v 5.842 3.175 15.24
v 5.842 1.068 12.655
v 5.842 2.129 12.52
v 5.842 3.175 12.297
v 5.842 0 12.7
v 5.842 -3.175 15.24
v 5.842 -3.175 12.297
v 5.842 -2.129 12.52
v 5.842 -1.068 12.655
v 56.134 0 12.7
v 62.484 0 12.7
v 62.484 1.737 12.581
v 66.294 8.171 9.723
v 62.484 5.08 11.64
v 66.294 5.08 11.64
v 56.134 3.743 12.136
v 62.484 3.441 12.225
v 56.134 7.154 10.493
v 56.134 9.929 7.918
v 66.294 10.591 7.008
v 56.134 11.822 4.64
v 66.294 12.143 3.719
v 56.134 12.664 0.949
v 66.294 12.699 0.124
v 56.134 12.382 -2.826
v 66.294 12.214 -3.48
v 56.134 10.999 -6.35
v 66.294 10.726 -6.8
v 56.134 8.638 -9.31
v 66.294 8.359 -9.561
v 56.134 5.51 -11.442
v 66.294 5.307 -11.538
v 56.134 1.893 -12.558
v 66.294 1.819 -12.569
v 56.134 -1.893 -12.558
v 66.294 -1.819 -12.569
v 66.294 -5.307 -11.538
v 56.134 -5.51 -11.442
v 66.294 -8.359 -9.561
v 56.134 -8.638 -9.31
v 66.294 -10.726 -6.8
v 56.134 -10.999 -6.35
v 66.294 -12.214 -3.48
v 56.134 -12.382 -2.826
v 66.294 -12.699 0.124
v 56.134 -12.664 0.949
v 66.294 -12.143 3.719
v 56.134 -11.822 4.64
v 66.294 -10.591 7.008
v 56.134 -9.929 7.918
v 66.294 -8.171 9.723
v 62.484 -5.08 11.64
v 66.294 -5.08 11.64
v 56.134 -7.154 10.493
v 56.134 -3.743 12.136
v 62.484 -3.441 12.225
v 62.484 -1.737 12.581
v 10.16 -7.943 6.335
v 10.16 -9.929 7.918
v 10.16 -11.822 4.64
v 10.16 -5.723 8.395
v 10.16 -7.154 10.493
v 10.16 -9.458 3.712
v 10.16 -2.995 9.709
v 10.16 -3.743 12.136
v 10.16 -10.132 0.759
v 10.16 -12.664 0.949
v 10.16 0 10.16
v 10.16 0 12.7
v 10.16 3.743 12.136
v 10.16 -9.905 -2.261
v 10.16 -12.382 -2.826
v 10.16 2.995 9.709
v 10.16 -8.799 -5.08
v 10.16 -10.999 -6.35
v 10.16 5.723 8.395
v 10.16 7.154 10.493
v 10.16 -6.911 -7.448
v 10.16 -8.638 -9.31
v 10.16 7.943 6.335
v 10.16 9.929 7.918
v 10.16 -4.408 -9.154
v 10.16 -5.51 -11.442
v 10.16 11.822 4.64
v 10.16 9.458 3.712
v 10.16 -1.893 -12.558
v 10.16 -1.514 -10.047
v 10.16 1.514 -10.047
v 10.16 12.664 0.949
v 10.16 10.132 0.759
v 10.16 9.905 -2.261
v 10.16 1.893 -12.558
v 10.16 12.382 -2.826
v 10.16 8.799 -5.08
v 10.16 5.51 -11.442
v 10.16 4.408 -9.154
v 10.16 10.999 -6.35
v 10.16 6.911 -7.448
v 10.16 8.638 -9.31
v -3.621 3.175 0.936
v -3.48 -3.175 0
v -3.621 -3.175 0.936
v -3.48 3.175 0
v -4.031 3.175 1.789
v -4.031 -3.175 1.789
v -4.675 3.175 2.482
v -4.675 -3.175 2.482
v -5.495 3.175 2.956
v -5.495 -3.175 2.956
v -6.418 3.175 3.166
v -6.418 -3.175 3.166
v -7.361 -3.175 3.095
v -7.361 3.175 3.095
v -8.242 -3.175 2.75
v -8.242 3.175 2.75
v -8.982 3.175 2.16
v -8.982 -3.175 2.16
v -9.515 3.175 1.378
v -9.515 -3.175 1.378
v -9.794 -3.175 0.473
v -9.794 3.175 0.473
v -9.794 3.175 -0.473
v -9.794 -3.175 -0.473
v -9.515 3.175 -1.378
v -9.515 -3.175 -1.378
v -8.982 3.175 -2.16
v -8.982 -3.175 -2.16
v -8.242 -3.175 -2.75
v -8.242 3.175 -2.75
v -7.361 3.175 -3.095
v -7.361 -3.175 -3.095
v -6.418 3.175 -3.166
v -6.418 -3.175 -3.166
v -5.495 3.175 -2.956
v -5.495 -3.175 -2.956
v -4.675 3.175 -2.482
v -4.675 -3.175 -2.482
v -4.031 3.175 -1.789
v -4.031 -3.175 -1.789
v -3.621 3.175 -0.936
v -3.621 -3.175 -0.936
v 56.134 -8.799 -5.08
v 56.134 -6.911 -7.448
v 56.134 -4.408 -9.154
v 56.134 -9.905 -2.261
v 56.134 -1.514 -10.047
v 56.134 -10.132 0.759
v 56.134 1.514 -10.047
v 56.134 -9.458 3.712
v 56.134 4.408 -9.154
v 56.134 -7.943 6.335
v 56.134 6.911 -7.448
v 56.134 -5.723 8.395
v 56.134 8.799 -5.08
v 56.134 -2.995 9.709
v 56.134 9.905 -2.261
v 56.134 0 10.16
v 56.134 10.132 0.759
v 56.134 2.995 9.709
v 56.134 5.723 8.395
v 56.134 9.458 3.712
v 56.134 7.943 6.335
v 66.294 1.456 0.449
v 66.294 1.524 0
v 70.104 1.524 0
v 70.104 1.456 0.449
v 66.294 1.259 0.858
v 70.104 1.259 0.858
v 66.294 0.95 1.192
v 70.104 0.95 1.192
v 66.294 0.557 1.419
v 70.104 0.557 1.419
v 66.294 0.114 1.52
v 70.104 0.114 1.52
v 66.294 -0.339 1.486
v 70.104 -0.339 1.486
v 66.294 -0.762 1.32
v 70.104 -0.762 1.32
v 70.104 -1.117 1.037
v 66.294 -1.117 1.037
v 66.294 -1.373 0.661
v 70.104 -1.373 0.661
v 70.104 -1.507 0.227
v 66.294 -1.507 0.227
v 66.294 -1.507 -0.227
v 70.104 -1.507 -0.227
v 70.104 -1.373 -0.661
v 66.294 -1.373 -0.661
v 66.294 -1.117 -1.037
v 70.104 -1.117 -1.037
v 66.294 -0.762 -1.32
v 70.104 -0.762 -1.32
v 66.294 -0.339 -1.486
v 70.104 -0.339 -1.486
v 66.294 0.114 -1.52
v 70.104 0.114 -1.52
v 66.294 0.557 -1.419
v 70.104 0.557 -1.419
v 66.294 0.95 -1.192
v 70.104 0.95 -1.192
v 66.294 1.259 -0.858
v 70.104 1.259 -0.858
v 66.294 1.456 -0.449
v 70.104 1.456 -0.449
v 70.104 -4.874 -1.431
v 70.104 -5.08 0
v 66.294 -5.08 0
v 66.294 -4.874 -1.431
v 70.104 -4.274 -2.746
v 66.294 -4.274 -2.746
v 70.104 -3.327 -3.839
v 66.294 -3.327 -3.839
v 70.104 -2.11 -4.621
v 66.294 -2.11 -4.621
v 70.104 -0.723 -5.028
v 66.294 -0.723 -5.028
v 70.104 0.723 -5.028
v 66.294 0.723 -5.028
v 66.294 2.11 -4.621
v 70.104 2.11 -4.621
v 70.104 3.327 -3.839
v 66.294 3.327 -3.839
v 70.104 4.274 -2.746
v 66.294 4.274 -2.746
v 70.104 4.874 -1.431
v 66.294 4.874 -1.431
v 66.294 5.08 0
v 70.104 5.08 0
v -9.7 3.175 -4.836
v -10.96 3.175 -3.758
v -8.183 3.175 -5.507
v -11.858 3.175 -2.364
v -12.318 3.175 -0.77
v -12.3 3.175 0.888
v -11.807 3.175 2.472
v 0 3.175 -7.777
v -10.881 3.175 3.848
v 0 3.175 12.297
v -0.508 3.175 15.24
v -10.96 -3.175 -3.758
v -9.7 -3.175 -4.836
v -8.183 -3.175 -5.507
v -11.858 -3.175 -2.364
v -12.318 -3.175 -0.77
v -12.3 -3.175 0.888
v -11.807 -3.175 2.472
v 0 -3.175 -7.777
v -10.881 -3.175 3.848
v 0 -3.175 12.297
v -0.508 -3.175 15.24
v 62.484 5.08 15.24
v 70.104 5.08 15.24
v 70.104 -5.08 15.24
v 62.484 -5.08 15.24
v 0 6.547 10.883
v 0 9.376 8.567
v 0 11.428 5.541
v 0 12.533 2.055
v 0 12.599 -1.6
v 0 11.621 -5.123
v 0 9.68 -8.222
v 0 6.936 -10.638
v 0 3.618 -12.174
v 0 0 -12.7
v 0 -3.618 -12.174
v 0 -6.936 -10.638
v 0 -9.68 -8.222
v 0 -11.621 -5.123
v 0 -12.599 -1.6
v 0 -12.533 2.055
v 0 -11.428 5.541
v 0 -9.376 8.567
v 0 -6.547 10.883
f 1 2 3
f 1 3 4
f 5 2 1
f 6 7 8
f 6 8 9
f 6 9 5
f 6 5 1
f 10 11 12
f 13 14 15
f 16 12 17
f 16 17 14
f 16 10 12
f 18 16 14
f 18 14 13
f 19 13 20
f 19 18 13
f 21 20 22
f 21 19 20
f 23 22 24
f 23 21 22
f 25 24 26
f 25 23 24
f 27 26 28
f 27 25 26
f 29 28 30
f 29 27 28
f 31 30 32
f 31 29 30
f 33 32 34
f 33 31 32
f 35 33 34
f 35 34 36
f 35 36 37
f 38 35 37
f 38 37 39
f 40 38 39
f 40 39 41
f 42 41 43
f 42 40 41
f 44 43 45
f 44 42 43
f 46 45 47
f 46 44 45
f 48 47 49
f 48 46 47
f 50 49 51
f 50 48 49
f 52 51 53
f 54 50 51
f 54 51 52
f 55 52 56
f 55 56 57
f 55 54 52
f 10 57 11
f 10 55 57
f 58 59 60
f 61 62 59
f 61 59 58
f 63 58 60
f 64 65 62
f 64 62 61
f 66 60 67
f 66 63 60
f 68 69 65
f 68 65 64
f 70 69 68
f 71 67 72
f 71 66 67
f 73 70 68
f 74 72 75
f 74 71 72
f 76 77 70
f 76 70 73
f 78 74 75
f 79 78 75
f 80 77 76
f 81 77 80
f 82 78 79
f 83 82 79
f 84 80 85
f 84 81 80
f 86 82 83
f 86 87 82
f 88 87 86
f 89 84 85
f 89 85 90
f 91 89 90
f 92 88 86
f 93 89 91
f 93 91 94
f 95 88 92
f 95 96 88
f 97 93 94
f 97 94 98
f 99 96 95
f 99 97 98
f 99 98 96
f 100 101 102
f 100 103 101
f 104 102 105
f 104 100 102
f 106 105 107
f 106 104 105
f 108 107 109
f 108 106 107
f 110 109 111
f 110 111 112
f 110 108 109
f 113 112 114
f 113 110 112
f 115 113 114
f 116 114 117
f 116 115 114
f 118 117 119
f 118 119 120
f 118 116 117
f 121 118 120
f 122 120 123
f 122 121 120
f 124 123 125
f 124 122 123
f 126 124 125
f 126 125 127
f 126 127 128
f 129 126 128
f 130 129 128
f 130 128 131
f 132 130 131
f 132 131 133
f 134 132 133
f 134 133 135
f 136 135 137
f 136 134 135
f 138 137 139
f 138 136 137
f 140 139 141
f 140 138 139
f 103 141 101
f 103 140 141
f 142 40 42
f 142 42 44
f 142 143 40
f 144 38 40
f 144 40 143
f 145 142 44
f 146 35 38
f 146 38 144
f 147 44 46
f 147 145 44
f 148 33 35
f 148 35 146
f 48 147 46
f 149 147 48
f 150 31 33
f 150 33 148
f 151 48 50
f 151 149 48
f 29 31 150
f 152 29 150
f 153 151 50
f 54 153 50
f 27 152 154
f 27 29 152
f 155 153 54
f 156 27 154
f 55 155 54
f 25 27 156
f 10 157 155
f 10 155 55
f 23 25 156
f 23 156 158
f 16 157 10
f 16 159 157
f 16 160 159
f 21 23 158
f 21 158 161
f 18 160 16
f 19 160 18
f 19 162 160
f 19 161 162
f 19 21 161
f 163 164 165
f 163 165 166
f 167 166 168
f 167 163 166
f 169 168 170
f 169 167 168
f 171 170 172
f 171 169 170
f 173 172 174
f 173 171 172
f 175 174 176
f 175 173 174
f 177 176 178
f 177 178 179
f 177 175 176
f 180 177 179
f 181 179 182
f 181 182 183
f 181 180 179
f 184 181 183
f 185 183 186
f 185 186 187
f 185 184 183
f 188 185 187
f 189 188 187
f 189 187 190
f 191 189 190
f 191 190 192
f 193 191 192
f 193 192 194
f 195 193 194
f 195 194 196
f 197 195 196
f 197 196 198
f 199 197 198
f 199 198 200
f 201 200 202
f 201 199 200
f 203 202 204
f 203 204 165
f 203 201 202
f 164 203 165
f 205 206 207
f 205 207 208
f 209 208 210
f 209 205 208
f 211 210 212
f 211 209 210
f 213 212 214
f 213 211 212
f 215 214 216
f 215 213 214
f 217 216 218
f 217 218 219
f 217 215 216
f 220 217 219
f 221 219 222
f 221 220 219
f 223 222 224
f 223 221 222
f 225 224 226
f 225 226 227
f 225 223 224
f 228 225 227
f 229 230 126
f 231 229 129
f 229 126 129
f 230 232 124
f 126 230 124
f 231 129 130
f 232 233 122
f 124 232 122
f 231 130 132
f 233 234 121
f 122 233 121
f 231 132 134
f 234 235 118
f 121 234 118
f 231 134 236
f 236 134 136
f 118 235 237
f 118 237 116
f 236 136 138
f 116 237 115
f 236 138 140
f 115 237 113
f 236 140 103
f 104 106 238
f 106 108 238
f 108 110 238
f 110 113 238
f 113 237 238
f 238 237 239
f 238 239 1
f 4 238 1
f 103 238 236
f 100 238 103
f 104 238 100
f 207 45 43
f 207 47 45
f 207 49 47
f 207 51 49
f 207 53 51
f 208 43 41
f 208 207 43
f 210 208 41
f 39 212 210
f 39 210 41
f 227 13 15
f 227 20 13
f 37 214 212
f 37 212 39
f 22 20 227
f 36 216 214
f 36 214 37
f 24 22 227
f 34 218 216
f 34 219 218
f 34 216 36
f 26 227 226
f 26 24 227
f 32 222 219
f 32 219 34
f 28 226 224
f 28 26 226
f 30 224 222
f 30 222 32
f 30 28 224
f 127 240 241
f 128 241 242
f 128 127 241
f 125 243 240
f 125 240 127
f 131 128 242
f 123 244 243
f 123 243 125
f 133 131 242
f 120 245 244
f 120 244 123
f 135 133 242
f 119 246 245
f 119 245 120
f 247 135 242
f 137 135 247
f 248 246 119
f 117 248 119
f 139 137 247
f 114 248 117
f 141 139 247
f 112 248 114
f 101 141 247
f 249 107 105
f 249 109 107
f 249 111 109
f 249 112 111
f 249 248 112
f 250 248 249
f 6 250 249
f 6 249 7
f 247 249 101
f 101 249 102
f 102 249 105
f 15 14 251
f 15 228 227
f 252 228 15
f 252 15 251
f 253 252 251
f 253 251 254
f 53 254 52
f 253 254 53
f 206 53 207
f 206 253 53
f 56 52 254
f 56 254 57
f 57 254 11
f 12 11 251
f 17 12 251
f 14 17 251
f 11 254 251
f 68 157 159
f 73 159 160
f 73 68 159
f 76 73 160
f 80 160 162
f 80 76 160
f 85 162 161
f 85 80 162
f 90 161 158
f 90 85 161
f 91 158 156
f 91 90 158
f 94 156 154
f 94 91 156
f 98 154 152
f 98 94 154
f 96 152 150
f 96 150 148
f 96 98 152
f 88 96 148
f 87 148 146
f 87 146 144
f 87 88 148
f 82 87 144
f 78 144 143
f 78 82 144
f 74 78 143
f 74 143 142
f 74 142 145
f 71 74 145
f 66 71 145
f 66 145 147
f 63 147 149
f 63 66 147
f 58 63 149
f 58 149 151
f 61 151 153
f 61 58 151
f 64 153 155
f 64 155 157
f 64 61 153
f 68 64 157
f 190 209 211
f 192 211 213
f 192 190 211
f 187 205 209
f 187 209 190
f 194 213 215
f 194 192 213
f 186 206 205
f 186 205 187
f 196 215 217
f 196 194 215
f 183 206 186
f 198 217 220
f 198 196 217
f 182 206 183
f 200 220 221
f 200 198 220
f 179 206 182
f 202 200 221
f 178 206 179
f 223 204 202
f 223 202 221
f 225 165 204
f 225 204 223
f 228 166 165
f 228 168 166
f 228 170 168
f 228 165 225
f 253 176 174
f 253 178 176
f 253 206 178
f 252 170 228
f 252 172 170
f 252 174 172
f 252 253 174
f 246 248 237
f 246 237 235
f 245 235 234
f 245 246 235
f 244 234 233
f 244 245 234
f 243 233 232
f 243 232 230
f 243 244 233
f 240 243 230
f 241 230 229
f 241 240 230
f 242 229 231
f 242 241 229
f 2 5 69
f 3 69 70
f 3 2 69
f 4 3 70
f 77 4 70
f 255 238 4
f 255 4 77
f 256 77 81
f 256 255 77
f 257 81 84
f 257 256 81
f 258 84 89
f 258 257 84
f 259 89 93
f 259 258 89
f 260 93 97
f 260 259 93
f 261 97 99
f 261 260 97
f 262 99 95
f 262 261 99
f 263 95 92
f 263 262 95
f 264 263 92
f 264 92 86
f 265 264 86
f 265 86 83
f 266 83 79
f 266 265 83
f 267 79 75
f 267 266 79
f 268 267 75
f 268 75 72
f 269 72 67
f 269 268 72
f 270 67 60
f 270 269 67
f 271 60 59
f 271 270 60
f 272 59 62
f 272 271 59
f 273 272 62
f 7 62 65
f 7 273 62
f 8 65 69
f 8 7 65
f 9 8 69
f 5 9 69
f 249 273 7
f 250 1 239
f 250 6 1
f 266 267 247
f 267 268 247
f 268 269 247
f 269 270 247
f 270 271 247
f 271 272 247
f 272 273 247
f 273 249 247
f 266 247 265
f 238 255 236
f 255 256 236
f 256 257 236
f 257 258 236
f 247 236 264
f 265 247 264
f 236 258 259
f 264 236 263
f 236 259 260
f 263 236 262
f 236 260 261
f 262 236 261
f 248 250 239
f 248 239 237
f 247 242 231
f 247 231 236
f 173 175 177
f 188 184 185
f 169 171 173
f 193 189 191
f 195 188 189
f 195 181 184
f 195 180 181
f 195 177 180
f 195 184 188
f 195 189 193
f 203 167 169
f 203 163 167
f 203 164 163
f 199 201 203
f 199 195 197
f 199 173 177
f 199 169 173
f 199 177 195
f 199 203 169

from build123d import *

# Parameters (mm, degrees)
F0_W     = 5.842
F0_H     = 12.7
F0_R     = 3.175
F2_DEPTH = 3.175
F3_R     = 1.524
F4_DEPTH = 3.81


with BuildPart() as f1:
    # F0 (on Front) → F1 (revolve)
    with BuildSketch(Plane.XZ):
        Polygon((5.842, 12.7), (5.842, 0), (66.294, 0), (66.294, 12.7), (56.134, 12.7), (56.134, 10.16), (10.16, 10.16), (10.16, 12.7), align=None)
        with Locations((2.921, 6.35)):
            Rectangle(F0_W, F0_H)
    revolve(axis=Axis((33.147, 0, 0), (-1, 0, 0)))

    # F0 (on Front) → F2 (join, symmetric)
    with BuildSketch(Plane.XZ):
        with Locations((2.921, 6.35)):
            Rectangle(F0_W, F0_H)
        with BuildLine():
            Line((-0.9398, 0), (0, 0))
            Line((0, 0), (0, 12.7))
            Line((0, 12.7), (5.842, 12.7))
            Line((5.842, 12.7), (5.842, 15.24))
            Line((5.842, 15.24), (-0.508, 15.24))
            Line((-0.508, 15.24), (-10.8806298187, 3.8475430269))
            ThreePointArc((-10.8806298187, 3.8475430269), (-4.5919612295, 5.3297205562), (-0.9398, 0))
        make_face()
        with BuildLine():
            Line((5.842, 0), (0, 0))
            Line((0, 0), (-0.9398, 0))
            ThreePointArc((-0.9398, 0), (-3.1957909266, -4.5493385486), (-8.1826630726, -5.5069827884))
            Line((-8.1826630726, -5.5069827884), (5.842, -9.398))
            Line((5.842, -9.398), (5.842, 0))
        make_face()
        with BuildLine():
            ThreePointArc((-8.1826630726, -5.5069827884), (-3.1957909266, -4.5493385486), (-0.9398, 0))
            ThreePointArc((-0.9398, 0), (-4.5919612295, 5.3297205562), (-10.8806298187, 3.8475430269))
            ThreePointArc((-10.8806298187, 3.8475430269), (-12.1459778134, -1.5837270034), (-8.1826630726, -5.5069827884))
        make_face()
        with Locations((-6.6548, 0)):
            Circle(F0_R, mode=Mode.SUBTRACT)
    extrude(amount=F2_DEPTH, both=True)

    # F3 (on face) → F4 (join, symmetric)
    with BuildSketch(Plane.YZ.offset(66.294)):
        with BuildLine():
            ThreePointArc((-5.08, 0), (0, 5.08), (5.08, 0))
            Line((5.08, 0), (5.08, 11.6397422652))
            ThreePointArc((5.08, 11.6397422652), (0, 12.7), (-5.08, 11.6397422652))
            Line((-5.08, 11.6397422652), (-5.08, 0))
        make_face()
        with BuildLine():
            ThreePointArc((-5.08, 0), (0, -5.08), (5.08, 0))
            ThreePointArc((5.08, 0), (0, 5.08), (-5.08, 0))
        make_face()
        Circle(F3_R, mode=Mode.SUBTRACT)
        with BuildLine():
            ThreePointArc((-5.08, 11.6397422652), (0, 12.7), (5.08, 11.6397422652))
            Line((5.08, 11.6397422652), (5.08, 15.24))
            Line((5.08, 15.24), (-5.08, 15.24))
            Line((-5.08, 15.24), (-5.08, 11.6397422652))
        make_face()
    extrude(amount=F4_DEPTH, both=True)


solid = f1.part
